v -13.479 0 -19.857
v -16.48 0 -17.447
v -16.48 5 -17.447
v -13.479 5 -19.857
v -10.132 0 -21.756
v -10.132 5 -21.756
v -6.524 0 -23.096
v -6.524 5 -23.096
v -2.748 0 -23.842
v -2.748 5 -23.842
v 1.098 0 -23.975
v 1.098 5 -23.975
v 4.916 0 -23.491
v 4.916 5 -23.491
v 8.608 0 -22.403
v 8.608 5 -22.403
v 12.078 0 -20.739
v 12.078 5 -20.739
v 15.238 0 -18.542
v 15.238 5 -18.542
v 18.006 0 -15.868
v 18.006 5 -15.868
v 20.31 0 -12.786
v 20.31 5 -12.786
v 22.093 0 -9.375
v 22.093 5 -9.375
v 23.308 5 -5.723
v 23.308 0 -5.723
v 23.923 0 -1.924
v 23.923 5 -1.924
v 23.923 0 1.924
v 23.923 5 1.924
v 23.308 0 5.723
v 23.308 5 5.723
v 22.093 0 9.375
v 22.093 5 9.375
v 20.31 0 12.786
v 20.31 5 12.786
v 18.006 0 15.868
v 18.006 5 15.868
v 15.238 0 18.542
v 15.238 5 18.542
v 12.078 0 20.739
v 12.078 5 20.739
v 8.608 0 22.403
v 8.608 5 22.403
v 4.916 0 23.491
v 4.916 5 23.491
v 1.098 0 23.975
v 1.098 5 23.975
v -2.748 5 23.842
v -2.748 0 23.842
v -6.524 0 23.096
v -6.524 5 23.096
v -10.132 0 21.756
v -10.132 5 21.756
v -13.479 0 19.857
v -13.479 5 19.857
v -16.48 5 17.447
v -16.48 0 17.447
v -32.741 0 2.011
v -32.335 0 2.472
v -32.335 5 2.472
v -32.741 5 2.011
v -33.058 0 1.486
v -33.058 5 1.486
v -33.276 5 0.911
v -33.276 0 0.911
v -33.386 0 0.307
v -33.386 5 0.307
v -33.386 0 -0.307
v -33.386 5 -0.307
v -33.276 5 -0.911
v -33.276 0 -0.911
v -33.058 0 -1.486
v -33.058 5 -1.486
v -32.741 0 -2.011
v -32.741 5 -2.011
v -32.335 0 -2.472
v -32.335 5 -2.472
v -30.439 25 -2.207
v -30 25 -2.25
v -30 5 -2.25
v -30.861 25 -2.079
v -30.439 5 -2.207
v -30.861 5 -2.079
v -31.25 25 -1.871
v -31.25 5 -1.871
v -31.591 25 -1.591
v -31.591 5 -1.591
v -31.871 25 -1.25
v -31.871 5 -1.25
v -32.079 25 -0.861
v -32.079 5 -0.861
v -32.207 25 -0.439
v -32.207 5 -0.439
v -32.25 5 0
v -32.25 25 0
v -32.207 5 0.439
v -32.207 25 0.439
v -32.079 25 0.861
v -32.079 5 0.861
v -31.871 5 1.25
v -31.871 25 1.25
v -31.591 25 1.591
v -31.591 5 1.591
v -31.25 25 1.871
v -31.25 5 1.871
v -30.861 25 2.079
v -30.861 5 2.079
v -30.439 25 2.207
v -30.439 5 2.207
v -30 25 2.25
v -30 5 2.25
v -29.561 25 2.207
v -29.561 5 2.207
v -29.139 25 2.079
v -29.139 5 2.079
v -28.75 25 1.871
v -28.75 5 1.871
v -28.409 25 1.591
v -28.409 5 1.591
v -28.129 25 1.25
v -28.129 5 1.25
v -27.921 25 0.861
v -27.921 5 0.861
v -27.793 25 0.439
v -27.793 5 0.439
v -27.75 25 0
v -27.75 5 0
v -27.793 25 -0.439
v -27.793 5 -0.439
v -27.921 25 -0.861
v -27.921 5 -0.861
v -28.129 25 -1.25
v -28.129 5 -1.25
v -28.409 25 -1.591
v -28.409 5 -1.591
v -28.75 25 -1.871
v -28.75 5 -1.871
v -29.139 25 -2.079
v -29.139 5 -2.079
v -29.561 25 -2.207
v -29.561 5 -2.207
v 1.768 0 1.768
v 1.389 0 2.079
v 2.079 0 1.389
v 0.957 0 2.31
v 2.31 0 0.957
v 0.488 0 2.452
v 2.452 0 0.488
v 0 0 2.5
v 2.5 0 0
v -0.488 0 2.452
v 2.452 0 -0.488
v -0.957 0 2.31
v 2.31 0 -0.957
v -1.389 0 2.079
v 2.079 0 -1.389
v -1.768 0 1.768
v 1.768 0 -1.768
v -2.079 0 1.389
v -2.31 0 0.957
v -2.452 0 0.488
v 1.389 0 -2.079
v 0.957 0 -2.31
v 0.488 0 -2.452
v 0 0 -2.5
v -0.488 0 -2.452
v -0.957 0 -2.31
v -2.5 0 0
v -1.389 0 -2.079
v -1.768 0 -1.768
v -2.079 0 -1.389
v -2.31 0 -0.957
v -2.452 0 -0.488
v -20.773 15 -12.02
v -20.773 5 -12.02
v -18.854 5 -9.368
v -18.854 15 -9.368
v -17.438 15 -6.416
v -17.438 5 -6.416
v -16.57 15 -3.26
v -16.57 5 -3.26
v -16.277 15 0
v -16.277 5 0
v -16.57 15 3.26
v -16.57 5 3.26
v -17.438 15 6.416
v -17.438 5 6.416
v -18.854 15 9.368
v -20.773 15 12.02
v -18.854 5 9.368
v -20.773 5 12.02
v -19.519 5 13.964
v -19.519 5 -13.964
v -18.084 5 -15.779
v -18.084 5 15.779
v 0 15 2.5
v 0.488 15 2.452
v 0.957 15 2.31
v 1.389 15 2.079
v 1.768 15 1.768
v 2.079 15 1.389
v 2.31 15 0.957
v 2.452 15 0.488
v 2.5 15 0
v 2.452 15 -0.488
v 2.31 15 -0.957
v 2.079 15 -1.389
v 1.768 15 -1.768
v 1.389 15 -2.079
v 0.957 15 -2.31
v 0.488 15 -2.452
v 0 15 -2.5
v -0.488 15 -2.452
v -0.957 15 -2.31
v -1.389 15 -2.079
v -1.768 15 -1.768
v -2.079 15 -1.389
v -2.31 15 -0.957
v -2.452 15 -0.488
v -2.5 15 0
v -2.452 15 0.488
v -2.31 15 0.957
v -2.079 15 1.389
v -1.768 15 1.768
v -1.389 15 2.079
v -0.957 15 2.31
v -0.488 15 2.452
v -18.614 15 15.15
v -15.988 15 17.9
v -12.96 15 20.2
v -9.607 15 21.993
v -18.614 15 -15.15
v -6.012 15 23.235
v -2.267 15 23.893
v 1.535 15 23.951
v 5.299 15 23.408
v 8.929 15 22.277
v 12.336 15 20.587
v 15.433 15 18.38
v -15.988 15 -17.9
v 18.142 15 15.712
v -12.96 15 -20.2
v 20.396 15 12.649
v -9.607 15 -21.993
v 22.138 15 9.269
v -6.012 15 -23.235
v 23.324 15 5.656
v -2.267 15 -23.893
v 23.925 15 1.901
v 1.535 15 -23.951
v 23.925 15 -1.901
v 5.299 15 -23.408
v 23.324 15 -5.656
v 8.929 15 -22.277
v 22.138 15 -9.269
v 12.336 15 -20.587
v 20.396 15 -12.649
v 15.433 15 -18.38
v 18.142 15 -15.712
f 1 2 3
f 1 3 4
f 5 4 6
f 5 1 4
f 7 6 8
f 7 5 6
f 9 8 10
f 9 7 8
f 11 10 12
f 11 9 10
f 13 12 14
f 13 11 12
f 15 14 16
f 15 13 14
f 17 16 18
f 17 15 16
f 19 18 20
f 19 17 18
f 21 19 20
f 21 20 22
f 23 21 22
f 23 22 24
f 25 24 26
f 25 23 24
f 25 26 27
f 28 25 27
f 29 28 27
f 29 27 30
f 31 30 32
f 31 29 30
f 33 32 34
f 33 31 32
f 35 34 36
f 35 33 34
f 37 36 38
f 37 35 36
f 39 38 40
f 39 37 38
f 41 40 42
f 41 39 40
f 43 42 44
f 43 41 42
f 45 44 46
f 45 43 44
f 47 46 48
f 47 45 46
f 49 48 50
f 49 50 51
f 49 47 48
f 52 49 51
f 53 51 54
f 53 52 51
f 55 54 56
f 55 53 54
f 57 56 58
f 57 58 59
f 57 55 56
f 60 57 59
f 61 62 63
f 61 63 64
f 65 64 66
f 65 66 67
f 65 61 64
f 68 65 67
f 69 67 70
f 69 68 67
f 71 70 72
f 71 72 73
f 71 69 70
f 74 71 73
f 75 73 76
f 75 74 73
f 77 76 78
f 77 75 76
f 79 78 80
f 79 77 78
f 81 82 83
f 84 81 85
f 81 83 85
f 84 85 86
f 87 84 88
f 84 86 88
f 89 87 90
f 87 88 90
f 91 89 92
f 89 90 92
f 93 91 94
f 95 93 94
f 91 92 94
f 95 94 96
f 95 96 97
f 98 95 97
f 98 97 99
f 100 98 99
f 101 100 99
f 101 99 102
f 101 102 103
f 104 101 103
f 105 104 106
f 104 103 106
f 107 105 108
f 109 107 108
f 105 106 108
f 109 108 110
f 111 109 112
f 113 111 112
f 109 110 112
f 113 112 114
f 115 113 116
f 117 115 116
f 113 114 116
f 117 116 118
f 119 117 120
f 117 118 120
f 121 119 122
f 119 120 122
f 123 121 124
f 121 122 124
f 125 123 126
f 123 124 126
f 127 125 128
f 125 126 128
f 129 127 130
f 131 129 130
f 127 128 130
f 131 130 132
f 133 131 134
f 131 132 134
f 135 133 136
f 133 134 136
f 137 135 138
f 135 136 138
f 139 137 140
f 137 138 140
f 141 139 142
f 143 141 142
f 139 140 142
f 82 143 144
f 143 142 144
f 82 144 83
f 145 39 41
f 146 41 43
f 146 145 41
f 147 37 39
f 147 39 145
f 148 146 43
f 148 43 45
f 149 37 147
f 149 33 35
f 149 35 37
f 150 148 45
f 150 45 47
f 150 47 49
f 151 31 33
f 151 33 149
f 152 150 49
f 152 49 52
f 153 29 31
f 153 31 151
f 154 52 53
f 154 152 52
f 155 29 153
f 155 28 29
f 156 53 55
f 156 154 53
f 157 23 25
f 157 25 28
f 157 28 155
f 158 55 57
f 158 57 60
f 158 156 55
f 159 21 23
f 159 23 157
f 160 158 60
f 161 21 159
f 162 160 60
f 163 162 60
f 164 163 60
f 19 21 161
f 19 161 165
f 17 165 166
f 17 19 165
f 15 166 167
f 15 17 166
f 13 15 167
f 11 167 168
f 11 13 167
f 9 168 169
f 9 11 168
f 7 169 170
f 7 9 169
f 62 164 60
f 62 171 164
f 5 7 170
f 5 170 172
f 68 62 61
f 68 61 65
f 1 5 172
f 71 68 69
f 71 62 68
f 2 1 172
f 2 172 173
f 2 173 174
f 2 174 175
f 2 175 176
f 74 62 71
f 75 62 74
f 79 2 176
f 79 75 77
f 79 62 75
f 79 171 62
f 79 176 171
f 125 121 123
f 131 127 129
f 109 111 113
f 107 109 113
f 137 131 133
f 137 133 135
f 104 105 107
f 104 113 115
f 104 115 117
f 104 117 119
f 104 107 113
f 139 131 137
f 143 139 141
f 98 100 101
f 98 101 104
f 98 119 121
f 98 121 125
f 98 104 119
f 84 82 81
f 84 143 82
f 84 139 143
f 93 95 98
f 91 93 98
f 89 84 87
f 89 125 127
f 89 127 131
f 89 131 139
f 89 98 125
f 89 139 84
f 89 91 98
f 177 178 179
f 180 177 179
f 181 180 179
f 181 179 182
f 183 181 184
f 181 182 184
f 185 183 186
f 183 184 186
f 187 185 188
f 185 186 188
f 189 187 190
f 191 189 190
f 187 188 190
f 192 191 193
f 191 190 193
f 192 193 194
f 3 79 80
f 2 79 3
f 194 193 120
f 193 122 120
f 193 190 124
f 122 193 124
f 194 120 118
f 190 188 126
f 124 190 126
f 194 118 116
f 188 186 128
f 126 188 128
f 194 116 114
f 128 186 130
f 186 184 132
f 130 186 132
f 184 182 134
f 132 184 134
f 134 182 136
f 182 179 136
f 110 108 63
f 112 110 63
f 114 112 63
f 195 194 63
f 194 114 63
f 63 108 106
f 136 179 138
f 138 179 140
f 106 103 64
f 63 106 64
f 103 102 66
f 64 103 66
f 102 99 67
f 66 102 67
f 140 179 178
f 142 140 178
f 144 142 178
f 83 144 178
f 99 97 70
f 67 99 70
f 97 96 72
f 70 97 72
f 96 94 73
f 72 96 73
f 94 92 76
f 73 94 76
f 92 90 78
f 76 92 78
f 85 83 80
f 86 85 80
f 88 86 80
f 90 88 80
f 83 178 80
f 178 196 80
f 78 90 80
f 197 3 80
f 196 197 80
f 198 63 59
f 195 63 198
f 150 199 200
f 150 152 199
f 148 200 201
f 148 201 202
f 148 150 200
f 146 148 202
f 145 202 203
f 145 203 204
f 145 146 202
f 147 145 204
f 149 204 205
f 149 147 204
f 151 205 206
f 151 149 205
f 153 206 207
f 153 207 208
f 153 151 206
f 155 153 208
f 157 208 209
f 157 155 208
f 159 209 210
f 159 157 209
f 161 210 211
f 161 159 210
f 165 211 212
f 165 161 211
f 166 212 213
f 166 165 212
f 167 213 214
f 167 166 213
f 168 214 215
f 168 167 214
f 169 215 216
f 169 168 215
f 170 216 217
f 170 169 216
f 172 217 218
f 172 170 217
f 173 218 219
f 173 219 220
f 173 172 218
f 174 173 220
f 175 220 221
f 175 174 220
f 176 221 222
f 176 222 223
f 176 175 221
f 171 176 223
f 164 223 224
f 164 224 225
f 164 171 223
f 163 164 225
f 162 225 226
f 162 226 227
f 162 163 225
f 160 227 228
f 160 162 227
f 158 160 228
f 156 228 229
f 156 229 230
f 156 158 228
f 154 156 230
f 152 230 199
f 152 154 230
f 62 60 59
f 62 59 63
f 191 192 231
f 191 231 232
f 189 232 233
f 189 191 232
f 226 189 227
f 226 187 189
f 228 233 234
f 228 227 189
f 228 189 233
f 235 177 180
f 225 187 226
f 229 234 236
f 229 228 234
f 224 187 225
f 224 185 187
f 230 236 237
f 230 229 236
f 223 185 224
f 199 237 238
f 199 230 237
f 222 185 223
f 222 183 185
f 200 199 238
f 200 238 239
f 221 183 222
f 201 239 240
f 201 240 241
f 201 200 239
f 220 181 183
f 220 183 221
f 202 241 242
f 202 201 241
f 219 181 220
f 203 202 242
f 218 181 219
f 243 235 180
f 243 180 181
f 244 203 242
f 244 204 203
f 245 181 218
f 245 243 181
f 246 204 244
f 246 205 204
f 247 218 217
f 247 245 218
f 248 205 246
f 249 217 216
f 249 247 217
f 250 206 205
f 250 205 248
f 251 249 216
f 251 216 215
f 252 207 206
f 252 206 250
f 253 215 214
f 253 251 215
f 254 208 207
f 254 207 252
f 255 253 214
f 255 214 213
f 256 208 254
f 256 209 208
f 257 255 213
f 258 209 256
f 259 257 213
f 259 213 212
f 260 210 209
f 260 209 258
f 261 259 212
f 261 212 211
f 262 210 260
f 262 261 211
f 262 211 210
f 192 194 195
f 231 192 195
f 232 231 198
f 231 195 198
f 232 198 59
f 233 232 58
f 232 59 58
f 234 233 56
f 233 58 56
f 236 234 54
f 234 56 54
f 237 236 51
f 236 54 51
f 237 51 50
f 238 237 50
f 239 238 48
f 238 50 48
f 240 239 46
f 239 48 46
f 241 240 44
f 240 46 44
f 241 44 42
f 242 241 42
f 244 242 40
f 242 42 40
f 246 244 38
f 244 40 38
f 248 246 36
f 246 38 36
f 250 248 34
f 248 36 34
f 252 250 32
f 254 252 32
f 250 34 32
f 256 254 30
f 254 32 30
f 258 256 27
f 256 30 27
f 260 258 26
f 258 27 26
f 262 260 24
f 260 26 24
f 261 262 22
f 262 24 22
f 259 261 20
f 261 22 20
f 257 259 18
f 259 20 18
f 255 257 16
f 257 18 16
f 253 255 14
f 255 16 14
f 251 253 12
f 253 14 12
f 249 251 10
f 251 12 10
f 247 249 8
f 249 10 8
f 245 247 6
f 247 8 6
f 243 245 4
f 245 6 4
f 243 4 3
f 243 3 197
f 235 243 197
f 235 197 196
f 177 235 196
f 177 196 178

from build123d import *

# Parameters (mm, degrees)
SKETCH_2_R      = 2.5
EXTRUDE_1_DEPTH = 5
SKETCH_5_R      = 2.25
SKETCH_5_R_2    = 2.5
EXTRUDE_4_DEPTH = 10
SKETCH_6_R      = 2.25
EXTRUDE_5_DEPTH = 10


with BuildPart() as part:
    # 草圖2 → 填料-伸長1 (new body)
    with BuildSketch(Plane(origin=(0, 0, 0), x_dir=(1, 0, 0), z_dir=(0, 1, 0))):
        with BuildLine():
            Line((-32.334666667, 2.471706203), (-16.48, 17.447337906))
            ThreePointArc((-16.48, 17.447337906), (24, 0), (-16.48, -17.447337906))
            Line((-16.48, -17.447337906), (-32.334666667, -2.471706203))
            ThreePointArc((-32.334666667, -2.471706203), (-33.4, 0), (-32.334666667, 2.471706203))
        make_face()
        with Locations(Location((0, 0, 0), (0, 0, 270))):
            Circle(SKETCH_2_R, mode=Mode.SUBTRACT)
    extrude(amount=EXTRUDE_1_DEPTH)

    # 草圖5 → 填料-伸長4 (add)
    # profile 1 of 2: a face of its own
    with BuildSketch(Plane(origin=(0, 5, 0), x_dir=(1, 0, 0), z_dir=(0, 1, 0))):
        with Locations(Location((-30, 0, 0), (0, 0, 90))):
            Circle(SKETCH_5_R)
    # profile 2 of 2: a face of its own
    with BuildSketch(Plane(origin=(0, 5, 0), x_dir=(1, 0, 0), z_dir=(0, 1, 0))):
        with BuildLine():
            ThreePointArc((-20.773318517, -12.019535673), (24, 0), (-20.773318517, 12.019535673))
            ThreePointArc((-20.773318517, 12.019535673), (-16.277495404, 0), (-20.773318517, -12.019535673))
        make_face()
        with Locations(Location((0, 0, 0), (0, 0, 270))):
            Circle(SKETCH_5_R_2, mode=Mode.SUBTRACT)
    extrude(amount=EXTRUDE_4_DEPTH)

    # 草圖6 → 填料-伸長5 (add)
    with BuildSketch(Plane(origin=(0, 15, 0), x_dir=(1, 0, 0), z_dir=(0, 1, 0))):
        with Locations(Location((-30, 0, 0), (0, 0, 90))):
            Circle(SKETCH_6_R)
    extrude(amount=EXTRUDE_5_DEPTH)


solid = part.part
